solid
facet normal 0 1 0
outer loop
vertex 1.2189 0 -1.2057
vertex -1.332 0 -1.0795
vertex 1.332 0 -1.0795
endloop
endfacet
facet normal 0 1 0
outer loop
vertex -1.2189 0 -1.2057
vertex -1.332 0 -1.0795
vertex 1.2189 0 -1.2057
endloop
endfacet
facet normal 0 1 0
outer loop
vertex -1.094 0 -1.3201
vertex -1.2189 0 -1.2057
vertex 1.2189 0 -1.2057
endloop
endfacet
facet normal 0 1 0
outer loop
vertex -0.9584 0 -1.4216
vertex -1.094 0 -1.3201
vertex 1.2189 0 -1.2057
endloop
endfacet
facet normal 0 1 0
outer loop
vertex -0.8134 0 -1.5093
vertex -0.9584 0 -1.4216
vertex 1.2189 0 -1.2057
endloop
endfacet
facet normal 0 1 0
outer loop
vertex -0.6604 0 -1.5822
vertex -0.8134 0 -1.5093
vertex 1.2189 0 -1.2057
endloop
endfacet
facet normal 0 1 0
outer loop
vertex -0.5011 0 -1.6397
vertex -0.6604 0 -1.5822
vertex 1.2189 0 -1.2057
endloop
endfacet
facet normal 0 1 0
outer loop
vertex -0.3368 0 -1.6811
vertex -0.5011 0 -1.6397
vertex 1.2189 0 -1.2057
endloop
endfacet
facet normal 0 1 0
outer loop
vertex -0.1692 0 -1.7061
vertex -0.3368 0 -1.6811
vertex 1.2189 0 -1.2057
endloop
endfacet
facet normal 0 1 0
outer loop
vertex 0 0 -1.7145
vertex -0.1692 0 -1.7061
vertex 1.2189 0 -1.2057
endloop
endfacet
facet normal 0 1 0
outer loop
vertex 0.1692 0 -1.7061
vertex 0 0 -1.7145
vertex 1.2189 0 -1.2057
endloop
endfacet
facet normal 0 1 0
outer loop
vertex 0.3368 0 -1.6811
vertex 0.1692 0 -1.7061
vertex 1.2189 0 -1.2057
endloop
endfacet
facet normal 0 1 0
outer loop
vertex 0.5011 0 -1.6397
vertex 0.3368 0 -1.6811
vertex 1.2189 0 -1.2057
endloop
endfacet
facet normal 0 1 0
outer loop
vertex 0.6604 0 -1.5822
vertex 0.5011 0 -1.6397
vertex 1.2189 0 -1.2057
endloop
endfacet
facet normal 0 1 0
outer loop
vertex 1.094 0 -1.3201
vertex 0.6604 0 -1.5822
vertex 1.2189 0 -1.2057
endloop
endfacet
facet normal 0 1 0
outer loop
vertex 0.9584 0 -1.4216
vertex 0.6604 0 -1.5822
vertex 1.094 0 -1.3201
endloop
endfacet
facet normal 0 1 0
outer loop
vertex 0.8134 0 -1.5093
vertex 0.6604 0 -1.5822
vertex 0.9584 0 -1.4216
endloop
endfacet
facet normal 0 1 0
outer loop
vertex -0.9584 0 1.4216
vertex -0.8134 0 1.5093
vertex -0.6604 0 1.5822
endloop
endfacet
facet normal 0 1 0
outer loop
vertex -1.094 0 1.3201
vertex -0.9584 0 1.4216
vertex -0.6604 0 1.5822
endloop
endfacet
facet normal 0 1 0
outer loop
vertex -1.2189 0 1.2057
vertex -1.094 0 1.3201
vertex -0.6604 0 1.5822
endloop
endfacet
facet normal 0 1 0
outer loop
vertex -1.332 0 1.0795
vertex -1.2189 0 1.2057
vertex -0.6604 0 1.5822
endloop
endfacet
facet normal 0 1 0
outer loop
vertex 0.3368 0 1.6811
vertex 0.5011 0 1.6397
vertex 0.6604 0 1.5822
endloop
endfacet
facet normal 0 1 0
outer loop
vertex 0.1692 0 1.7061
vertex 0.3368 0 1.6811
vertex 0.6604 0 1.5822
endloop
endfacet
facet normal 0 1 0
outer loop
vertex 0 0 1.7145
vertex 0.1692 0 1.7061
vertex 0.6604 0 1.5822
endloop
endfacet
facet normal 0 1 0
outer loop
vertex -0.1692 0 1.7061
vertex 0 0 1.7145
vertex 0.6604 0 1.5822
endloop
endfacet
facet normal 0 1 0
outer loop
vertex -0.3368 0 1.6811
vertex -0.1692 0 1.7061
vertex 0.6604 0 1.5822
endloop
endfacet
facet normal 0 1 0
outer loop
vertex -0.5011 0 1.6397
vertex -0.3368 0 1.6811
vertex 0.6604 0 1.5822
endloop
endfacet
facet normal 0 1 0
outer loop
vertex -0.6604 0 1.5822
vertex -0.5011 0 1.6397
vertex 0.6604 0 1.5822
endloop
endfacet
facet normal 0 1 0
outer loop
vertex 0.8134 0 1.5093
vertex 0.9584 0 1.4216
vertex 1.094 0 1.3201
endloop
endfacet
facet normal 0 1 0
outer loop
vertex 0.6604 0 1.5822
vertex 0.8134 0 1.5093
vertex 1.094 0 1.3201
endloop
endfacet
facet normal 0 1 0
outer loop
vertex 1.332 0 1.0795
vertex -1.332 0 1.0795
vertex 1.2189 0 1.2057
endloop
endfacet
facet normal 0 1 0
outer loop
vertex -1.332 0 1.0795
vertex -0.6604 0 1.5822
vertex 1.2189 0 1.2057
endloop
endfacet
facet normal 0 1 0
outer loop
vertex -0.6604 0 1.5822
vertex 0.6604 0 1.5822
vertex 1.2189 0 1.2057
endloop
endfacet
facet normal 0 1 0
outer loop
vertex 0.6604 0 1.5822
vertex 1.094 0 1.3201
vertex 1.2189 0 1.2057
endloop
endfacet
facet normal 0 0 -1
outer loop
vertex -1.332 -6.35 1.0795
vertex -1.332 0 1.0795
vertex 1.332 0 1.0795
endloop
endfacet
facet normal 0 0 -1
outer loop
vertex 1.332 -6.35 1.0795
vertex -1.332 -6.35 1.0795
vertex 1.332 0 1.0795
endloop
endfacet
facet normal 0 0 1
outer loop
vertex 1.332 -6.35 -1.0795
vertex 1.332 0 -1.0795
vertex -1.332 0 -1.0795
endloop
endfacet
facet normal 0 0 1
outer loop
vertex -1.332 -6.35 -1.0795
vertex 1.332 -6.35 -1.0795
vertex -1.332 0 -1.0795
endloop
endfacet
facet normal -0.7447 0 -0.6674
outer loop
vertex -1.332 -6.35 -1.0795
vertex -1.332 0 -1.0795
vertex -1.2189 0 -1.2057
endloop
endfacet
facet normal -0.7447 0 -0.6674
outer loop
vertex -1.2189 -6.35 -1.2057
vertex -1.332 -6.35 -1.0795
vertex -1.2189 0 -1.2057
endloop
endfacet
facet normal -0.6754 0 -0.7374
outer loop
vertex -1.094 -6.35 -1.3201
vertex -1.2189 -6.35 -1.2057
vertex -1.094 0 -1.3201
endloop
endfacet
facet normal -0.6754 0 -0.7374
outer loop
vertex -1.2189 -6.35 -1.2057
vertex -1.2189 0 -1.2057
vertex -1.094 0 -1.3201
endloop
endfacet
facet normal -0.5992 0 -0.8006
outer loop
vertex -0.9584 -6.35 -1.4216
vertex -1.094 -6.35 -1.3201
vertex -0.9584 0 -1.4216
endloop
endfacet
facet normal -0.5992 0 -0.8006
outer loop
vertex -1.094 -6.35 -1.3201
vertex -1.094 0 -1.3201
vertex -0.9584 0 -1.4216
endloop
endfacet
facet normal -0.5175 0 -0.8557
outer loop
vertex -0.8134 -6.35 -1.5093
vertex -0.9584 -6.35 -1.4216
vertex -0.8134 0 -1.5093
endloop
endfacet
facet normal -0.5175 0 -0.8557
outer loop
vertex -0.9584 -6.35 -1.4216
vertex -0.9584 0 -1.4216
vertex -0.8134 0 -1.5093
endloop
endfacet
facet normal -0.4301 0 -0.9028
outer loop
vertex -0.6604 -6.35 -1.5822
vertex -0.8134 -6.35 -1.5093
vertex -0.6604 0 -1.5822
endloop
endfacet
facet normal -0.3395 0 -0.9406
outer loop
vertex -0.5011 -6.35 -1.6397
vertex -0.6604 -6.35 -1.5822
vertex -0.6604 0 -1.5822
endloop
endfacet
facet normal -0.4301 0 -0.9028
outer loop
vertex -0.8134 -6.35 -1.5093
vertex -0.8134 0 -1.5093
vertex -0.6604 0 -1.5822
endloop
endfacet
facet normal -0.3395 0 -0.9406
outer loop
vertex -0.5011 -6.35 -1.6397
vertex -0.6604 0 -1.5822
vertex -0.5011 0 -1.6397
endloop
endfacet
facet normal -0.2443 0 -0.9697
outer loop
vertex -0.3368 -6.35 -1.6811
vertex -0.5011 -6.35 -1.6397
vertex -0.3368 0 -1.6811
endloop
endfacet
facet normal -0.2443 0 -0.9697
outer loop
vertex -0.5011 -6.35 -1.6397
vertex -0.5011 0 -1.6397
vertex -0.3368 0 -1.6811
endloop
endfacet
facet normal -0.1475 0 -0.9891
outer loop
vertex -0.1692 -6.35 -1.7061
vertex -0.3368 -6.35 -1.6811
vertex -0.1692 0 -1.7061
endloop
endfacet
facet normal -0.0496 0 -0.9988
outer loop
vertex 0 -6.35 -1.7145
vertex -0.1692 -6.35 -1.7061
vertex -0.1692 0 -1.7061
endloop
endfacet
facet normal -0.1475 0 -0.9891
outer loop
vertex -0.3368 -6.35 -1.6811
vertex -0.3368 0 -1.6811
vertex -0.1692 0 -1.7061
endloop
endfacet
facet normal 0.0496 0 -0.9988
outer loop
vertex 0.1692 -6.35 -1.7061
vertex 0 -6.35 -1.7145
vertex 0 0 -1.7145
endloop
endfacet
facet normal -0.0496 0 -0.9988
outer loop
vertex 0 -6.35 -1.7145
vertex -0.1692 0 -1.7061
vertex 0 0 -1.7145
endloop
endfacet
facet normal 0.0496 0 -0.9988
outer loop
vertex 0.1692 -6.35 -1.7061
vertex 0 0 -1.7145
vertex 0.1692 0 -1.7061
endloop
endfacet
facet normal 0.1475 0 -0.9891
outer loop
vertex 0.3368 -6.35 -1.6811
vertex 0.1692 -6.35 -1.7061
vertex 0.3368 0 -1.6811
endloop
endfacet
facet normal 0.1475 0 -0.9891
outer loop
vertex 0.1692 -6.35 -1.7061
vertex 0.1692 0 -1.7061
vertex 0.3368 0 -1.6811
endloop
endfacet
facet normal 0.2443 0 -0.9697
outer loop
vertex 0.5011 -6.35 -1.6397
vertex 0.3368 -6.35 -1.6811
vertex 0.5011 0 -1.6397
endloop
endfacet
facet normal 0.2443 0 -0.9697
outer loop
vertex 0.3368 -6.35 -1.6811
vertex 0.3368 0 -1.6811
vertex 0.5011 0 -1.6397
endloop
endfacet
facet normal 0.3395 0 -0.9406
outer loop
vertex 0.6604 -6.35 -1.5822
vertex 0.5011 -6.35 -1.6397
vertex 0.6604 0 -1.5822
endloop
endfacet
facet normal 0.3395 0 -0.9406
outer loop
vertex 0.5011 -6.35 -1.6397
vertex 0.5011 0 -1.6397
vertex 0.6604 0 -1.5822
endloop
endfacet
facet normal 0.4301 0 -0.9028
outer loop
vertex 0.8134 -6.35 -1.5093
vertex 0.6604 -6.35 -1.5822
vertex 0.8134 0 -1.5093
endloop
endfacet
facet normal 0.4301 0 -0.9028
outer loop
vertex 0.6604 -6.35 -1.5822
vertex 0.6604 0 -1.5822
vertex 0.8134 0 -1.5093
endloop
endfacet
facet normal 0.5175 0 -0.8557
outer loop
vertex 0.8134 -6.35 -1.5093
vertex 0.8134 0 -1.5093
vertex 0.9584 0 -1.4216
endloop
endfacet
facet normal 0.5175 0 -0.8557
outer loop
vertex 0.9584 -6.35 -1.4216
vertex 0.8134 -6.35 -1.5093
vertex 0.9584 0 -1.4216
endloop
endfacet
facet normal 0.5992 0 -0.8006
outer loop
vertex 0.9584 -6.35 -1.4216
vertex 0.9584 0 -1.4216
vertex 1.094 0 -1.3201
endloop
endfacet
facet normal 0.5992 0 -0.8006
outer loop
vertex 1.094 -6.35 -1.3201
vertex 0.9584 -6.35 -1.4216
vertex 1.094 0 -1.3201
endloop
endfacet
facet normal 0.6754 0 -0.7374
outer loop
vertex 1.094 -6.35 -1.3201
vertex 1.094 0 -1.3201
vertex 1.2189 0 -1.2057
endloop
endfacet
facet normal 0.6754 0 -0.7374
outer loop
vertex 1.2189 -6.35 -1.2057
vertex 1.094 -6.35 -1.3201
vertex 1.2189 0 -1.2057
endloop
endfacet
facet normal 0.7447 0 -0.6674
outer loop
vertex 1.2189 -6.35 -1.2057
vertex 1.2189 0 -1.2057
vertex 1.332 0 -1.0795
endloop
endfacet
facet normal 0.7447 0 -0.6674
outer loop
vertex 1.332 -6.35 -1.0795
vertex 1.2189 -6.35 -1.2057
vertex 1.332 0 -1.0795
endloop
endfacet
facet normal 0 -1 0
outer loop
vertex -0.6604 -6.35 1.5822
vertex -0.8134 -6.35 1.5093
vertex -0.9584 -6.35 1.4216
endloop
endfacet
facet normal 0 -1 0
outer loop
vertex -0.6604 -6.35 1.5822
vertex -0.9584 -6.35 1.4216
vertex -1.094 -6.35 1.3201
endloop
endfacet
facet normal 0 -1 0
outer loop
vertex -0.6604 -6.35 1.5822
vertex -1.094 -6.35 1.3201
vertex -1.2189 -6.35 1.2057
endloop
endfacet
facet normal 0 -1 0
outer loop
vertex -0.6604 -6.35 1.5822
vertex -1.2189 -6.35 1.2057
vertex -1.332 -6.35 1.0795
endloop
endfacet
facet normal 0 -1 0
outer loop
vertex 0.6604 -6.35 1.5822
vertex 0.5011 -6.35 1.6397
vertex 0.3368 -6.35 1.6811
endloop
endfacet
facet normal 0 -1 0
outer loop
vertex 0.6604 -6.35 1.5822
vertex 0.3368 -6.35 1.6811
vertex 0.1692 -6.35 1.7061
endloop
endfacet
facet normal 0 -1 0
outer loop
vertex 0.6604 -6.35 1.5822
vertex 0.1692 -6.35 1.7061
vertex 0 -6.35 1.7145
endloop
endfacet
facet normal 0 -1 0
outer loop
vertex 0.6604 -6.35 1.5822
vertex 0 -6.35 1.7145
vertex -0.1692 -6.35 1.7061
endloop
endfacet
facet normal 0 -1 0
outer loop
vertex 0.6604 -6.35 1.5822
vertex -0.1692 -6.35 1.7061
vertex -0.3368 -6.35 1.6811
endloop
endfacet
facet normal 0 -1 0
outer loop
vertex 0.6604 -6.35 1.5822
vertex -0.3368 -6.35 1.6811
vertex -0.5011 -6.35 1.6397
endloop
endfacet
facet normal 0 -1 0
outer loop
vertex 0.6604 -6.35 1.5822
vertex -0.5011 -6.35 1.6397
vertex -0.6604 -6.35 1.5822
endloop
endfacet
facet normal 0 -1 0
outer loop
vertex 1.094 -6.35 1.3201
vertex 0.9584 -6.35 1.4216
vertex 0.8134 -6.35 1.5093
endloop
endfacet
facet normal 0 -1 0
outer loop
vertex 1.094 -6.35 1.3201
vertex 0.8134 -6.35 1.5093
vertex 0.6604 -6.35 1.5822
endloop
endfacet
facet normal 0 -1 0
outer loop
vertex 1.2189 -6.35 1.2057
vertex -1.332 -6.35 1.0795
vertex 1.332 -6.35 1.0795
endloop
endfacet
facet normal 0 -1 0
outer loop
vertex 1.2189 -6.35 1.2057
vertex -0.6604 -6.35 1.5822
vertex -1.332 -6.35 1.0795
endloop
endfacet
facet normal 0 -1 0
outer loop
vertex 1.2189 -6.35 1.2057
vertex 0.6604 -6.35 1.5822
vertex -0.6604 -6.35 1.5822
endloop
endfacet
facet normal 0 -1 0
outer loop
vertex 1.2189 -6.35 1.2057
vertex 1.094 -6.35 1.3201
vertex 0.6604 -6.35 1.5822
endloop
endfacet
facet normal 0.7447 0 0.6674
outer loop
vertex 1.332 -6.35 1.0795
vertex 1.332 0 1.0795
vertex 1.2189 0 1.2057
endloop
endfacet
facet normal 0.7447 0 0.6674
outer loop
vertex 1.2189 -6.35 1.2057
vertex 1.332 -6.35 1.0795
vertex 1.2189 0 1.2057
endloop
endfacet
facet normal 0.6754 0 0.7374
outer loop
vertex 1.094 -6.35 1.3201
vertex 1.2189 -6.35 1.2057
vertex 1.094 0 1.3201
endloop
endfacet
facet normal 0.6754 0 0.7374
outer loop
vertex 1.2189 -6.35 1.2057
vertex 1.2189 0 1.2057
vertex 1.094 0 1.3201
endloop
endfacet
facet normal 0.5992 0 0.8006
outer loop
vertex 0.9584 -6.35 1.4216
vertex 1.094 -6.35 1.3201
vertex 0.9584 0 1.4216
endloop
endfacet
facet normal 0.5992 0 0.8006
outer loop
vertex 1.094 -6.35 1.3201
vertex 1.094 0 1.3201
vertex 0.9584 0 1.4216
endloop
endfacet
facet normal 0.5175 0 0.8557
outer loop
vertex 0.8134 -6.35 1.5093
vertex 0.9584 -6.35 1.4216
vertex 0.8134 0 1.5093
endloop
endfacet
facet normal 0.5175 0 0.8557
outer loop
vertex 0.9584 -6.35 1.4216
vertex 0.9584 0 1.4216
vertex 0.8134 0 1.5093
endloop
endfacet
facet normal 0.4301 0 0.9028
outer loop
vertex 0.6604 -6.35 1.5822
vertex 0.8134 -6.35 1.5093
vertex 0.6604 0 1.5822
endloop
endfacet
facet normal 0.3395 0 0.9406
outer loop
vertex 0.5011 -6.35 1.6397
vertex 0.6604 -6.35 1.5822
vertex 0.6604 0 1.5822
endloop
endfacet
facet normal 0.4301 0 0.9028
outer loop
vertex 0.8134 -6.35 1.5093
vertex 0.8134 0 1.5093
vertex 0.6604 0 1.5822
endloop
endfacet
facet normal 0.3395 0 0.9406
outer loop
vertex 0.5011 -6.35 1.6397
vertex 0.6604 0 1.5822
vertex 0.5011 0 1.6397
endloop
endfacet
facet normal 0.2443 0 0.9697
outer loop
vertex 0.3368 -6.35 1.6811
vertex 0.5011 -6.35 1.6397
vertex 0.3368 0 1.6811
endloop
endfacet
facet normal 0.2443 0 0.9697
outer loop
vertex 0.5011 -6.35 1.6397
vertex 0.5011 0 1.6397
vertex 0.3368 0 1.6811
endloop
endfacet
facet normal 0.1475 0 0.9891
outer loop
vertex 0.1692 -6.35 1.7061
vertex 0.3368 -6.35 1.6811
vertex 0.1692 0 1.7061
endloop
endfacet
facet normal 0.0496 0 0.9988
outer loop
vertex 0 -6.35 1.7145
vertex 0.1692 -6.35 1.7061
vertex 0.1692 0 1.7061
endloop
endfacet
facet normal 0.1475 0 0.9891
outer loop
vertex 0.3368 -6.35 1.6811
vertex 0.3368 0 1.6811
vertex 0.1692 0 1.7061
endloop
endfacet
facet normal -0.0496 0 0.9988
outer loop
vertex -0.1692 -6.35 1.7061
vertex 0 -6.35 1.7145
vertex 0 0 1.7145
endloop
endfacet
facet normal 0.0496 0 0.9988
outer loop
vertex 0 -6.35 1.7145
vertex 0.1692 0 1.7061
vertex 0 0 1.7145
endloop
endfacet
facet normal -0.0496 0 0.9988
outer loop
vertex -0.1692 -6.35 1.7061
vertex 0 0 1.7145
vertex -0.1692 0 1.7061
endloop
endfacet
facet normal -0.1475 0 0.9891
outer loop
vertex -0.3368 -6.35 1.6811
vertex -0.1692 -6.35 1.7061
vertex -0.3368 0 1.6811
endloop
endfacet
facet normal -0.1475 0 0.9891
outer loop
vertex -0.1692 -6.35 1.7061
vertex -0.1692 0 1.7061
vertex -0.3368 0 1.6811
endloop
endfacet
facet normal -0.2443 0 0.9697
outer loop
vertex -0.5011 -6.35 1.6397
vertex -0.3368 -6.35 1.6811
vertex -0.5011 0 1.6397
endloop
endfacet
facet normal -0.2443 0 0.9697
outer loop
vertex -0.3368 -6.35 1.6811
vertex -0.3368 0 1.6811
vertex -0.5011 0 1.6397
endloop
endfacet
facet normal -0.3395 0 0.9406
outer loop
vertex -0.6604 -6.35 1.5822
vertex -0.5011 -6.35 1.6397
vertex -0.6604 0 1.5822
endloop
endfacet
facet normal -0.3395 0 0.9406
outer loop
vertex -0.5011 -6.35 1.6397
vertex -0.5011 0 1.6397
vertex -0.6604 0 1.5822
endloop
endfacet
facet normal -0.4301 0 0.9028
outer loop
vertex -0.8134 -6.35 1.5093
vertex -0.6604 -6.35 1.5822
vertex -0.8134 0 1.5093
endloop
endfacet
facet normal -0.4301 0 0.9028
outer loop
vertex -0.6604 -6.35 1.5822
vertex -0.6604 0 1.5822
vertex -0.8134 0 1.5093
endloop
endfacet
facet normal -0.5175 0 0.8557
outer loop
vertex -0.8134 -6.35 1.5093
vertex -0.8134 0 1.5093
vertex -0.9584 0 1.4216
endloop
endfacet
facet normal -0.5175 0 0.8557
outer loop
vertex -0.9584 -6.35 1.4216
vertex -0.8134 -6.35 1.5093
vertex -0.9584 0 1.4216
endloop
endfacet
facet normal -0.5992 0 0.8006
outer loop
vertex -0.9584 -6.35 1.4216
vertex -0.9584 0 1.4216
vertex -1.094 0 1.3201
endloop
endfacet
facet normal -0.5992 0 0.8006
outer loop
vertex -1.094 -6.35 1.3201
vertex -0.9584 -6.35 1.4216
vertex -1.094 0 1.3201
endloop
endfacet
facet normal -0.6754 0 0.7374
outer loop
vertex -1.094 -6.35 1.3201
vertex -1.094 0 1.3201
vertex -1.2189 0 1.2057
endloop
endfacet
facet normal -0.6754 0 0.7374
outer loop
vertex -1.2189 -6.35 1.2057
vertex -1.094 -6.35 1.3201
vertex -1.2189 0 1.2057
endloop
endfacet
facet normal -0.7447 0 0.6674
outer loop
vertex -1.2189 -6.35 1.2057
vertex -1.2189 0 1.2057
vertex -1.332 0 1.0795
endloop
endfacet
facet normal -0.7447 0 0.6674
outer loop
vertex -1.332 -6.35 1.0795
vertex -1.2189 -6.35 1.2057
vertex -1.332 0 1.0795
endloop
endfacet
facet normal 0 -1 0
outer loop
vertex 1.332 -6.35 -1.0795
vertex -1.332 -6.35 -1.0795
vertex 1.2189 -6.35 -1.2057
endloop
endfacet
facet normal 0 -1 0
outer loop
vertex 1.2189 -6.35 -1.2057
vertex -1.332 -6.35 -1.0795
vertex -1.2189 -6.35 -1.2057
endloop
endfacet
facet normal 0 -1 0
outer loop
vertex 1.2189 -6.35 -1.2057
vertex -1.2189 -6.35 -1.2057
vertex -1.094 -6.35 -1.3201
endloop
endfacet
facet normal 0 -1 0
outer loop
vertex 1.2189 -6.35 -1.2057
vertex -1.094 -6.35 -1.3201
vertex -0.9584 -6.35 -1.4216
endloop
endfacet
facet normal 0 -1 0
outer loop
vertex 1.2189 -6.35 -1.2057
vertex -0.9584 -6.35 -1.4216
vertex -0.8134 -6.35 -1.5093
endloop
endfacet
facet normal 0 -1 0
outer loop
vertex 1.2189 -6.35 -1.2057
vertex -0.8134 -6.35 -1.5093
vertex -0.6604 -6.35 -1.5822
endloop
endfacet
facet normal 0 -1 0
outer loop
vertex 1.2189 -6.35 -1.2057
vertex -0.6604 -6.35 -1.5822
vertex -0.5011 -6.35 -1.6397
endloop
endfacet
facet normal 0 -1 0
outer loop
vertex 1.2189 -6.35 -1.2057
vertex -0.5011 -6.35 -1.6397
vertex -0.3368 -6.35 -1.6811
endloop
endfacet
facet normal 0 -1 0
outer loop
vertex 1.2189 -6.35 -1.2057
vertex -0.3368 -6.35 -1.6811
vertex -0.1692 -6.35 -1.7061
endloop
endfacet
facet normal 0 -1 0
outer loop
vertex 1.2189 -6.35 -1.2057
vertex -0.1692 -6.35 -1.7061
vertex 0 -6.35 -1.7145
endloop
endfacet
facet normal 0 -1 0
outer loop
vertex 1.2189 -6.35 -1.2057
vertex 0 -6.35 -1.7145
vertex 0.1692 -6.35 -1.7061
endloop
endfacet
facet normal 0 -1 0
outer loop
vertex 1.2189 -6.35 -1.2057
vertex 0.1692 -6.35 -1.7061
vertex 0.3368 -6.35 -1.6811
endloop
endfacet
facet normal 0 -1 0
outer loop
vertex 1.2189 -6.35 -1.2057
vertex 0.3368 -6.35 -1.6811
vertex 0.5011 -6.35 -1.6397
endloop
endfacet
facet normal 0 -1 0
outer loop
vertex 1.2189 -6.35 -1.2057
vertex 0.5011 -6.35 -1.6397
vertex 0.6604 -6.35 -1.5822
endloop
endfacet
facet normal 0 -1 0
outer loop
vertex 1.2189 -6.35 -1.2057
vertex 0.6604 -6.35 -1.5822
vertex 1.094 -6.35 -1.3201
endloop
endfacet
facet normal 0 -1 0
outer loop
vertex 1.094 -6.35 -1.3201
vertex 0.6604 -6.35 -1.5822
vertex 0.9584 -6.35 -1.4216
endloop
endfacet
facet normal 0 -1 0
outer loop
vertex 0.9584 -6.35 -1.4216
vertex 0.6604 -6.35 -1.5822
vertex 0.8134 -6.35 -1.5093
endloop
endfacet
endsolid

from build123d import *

# Parameters (mm, degrees)
F1_DEPTH = 6.35


# Not quite as in the source:
# - a feature names something its author has since deleted; it is built from what else it names


with BuildPart() as f1:
    # F0 (on Front) → F1 (new body)
    with BuildSketch(Plane.XZ):
        with BuildLine():
            Line((-1.3319872372, 1.0795), (1.3319872372, 1.0795))
            ThreePointArc((1.3319872372, 1.0795), (0, 1.7145), (-1.3319872372, 1.0795))
        make_face()
    extrude(amount=F1_DEPTH)


with BuildPart() as f1b:
    # F0 (on Front) → F1, piece 2 (new body)
    with BuildSketch(Plane.XZ):
        with BuildLine():
            ThreePointArc((-1.3319872372, -1.0795), (0, -1.7145), (1.3319872372, -1.0795))
            Line((1.3319872372, -1.0795), (-1.3319872372, -1.0795))
        make_face()
    extrude(amount=F1_DEPTH)


solid = Compound([f1.part, f1b.part])
